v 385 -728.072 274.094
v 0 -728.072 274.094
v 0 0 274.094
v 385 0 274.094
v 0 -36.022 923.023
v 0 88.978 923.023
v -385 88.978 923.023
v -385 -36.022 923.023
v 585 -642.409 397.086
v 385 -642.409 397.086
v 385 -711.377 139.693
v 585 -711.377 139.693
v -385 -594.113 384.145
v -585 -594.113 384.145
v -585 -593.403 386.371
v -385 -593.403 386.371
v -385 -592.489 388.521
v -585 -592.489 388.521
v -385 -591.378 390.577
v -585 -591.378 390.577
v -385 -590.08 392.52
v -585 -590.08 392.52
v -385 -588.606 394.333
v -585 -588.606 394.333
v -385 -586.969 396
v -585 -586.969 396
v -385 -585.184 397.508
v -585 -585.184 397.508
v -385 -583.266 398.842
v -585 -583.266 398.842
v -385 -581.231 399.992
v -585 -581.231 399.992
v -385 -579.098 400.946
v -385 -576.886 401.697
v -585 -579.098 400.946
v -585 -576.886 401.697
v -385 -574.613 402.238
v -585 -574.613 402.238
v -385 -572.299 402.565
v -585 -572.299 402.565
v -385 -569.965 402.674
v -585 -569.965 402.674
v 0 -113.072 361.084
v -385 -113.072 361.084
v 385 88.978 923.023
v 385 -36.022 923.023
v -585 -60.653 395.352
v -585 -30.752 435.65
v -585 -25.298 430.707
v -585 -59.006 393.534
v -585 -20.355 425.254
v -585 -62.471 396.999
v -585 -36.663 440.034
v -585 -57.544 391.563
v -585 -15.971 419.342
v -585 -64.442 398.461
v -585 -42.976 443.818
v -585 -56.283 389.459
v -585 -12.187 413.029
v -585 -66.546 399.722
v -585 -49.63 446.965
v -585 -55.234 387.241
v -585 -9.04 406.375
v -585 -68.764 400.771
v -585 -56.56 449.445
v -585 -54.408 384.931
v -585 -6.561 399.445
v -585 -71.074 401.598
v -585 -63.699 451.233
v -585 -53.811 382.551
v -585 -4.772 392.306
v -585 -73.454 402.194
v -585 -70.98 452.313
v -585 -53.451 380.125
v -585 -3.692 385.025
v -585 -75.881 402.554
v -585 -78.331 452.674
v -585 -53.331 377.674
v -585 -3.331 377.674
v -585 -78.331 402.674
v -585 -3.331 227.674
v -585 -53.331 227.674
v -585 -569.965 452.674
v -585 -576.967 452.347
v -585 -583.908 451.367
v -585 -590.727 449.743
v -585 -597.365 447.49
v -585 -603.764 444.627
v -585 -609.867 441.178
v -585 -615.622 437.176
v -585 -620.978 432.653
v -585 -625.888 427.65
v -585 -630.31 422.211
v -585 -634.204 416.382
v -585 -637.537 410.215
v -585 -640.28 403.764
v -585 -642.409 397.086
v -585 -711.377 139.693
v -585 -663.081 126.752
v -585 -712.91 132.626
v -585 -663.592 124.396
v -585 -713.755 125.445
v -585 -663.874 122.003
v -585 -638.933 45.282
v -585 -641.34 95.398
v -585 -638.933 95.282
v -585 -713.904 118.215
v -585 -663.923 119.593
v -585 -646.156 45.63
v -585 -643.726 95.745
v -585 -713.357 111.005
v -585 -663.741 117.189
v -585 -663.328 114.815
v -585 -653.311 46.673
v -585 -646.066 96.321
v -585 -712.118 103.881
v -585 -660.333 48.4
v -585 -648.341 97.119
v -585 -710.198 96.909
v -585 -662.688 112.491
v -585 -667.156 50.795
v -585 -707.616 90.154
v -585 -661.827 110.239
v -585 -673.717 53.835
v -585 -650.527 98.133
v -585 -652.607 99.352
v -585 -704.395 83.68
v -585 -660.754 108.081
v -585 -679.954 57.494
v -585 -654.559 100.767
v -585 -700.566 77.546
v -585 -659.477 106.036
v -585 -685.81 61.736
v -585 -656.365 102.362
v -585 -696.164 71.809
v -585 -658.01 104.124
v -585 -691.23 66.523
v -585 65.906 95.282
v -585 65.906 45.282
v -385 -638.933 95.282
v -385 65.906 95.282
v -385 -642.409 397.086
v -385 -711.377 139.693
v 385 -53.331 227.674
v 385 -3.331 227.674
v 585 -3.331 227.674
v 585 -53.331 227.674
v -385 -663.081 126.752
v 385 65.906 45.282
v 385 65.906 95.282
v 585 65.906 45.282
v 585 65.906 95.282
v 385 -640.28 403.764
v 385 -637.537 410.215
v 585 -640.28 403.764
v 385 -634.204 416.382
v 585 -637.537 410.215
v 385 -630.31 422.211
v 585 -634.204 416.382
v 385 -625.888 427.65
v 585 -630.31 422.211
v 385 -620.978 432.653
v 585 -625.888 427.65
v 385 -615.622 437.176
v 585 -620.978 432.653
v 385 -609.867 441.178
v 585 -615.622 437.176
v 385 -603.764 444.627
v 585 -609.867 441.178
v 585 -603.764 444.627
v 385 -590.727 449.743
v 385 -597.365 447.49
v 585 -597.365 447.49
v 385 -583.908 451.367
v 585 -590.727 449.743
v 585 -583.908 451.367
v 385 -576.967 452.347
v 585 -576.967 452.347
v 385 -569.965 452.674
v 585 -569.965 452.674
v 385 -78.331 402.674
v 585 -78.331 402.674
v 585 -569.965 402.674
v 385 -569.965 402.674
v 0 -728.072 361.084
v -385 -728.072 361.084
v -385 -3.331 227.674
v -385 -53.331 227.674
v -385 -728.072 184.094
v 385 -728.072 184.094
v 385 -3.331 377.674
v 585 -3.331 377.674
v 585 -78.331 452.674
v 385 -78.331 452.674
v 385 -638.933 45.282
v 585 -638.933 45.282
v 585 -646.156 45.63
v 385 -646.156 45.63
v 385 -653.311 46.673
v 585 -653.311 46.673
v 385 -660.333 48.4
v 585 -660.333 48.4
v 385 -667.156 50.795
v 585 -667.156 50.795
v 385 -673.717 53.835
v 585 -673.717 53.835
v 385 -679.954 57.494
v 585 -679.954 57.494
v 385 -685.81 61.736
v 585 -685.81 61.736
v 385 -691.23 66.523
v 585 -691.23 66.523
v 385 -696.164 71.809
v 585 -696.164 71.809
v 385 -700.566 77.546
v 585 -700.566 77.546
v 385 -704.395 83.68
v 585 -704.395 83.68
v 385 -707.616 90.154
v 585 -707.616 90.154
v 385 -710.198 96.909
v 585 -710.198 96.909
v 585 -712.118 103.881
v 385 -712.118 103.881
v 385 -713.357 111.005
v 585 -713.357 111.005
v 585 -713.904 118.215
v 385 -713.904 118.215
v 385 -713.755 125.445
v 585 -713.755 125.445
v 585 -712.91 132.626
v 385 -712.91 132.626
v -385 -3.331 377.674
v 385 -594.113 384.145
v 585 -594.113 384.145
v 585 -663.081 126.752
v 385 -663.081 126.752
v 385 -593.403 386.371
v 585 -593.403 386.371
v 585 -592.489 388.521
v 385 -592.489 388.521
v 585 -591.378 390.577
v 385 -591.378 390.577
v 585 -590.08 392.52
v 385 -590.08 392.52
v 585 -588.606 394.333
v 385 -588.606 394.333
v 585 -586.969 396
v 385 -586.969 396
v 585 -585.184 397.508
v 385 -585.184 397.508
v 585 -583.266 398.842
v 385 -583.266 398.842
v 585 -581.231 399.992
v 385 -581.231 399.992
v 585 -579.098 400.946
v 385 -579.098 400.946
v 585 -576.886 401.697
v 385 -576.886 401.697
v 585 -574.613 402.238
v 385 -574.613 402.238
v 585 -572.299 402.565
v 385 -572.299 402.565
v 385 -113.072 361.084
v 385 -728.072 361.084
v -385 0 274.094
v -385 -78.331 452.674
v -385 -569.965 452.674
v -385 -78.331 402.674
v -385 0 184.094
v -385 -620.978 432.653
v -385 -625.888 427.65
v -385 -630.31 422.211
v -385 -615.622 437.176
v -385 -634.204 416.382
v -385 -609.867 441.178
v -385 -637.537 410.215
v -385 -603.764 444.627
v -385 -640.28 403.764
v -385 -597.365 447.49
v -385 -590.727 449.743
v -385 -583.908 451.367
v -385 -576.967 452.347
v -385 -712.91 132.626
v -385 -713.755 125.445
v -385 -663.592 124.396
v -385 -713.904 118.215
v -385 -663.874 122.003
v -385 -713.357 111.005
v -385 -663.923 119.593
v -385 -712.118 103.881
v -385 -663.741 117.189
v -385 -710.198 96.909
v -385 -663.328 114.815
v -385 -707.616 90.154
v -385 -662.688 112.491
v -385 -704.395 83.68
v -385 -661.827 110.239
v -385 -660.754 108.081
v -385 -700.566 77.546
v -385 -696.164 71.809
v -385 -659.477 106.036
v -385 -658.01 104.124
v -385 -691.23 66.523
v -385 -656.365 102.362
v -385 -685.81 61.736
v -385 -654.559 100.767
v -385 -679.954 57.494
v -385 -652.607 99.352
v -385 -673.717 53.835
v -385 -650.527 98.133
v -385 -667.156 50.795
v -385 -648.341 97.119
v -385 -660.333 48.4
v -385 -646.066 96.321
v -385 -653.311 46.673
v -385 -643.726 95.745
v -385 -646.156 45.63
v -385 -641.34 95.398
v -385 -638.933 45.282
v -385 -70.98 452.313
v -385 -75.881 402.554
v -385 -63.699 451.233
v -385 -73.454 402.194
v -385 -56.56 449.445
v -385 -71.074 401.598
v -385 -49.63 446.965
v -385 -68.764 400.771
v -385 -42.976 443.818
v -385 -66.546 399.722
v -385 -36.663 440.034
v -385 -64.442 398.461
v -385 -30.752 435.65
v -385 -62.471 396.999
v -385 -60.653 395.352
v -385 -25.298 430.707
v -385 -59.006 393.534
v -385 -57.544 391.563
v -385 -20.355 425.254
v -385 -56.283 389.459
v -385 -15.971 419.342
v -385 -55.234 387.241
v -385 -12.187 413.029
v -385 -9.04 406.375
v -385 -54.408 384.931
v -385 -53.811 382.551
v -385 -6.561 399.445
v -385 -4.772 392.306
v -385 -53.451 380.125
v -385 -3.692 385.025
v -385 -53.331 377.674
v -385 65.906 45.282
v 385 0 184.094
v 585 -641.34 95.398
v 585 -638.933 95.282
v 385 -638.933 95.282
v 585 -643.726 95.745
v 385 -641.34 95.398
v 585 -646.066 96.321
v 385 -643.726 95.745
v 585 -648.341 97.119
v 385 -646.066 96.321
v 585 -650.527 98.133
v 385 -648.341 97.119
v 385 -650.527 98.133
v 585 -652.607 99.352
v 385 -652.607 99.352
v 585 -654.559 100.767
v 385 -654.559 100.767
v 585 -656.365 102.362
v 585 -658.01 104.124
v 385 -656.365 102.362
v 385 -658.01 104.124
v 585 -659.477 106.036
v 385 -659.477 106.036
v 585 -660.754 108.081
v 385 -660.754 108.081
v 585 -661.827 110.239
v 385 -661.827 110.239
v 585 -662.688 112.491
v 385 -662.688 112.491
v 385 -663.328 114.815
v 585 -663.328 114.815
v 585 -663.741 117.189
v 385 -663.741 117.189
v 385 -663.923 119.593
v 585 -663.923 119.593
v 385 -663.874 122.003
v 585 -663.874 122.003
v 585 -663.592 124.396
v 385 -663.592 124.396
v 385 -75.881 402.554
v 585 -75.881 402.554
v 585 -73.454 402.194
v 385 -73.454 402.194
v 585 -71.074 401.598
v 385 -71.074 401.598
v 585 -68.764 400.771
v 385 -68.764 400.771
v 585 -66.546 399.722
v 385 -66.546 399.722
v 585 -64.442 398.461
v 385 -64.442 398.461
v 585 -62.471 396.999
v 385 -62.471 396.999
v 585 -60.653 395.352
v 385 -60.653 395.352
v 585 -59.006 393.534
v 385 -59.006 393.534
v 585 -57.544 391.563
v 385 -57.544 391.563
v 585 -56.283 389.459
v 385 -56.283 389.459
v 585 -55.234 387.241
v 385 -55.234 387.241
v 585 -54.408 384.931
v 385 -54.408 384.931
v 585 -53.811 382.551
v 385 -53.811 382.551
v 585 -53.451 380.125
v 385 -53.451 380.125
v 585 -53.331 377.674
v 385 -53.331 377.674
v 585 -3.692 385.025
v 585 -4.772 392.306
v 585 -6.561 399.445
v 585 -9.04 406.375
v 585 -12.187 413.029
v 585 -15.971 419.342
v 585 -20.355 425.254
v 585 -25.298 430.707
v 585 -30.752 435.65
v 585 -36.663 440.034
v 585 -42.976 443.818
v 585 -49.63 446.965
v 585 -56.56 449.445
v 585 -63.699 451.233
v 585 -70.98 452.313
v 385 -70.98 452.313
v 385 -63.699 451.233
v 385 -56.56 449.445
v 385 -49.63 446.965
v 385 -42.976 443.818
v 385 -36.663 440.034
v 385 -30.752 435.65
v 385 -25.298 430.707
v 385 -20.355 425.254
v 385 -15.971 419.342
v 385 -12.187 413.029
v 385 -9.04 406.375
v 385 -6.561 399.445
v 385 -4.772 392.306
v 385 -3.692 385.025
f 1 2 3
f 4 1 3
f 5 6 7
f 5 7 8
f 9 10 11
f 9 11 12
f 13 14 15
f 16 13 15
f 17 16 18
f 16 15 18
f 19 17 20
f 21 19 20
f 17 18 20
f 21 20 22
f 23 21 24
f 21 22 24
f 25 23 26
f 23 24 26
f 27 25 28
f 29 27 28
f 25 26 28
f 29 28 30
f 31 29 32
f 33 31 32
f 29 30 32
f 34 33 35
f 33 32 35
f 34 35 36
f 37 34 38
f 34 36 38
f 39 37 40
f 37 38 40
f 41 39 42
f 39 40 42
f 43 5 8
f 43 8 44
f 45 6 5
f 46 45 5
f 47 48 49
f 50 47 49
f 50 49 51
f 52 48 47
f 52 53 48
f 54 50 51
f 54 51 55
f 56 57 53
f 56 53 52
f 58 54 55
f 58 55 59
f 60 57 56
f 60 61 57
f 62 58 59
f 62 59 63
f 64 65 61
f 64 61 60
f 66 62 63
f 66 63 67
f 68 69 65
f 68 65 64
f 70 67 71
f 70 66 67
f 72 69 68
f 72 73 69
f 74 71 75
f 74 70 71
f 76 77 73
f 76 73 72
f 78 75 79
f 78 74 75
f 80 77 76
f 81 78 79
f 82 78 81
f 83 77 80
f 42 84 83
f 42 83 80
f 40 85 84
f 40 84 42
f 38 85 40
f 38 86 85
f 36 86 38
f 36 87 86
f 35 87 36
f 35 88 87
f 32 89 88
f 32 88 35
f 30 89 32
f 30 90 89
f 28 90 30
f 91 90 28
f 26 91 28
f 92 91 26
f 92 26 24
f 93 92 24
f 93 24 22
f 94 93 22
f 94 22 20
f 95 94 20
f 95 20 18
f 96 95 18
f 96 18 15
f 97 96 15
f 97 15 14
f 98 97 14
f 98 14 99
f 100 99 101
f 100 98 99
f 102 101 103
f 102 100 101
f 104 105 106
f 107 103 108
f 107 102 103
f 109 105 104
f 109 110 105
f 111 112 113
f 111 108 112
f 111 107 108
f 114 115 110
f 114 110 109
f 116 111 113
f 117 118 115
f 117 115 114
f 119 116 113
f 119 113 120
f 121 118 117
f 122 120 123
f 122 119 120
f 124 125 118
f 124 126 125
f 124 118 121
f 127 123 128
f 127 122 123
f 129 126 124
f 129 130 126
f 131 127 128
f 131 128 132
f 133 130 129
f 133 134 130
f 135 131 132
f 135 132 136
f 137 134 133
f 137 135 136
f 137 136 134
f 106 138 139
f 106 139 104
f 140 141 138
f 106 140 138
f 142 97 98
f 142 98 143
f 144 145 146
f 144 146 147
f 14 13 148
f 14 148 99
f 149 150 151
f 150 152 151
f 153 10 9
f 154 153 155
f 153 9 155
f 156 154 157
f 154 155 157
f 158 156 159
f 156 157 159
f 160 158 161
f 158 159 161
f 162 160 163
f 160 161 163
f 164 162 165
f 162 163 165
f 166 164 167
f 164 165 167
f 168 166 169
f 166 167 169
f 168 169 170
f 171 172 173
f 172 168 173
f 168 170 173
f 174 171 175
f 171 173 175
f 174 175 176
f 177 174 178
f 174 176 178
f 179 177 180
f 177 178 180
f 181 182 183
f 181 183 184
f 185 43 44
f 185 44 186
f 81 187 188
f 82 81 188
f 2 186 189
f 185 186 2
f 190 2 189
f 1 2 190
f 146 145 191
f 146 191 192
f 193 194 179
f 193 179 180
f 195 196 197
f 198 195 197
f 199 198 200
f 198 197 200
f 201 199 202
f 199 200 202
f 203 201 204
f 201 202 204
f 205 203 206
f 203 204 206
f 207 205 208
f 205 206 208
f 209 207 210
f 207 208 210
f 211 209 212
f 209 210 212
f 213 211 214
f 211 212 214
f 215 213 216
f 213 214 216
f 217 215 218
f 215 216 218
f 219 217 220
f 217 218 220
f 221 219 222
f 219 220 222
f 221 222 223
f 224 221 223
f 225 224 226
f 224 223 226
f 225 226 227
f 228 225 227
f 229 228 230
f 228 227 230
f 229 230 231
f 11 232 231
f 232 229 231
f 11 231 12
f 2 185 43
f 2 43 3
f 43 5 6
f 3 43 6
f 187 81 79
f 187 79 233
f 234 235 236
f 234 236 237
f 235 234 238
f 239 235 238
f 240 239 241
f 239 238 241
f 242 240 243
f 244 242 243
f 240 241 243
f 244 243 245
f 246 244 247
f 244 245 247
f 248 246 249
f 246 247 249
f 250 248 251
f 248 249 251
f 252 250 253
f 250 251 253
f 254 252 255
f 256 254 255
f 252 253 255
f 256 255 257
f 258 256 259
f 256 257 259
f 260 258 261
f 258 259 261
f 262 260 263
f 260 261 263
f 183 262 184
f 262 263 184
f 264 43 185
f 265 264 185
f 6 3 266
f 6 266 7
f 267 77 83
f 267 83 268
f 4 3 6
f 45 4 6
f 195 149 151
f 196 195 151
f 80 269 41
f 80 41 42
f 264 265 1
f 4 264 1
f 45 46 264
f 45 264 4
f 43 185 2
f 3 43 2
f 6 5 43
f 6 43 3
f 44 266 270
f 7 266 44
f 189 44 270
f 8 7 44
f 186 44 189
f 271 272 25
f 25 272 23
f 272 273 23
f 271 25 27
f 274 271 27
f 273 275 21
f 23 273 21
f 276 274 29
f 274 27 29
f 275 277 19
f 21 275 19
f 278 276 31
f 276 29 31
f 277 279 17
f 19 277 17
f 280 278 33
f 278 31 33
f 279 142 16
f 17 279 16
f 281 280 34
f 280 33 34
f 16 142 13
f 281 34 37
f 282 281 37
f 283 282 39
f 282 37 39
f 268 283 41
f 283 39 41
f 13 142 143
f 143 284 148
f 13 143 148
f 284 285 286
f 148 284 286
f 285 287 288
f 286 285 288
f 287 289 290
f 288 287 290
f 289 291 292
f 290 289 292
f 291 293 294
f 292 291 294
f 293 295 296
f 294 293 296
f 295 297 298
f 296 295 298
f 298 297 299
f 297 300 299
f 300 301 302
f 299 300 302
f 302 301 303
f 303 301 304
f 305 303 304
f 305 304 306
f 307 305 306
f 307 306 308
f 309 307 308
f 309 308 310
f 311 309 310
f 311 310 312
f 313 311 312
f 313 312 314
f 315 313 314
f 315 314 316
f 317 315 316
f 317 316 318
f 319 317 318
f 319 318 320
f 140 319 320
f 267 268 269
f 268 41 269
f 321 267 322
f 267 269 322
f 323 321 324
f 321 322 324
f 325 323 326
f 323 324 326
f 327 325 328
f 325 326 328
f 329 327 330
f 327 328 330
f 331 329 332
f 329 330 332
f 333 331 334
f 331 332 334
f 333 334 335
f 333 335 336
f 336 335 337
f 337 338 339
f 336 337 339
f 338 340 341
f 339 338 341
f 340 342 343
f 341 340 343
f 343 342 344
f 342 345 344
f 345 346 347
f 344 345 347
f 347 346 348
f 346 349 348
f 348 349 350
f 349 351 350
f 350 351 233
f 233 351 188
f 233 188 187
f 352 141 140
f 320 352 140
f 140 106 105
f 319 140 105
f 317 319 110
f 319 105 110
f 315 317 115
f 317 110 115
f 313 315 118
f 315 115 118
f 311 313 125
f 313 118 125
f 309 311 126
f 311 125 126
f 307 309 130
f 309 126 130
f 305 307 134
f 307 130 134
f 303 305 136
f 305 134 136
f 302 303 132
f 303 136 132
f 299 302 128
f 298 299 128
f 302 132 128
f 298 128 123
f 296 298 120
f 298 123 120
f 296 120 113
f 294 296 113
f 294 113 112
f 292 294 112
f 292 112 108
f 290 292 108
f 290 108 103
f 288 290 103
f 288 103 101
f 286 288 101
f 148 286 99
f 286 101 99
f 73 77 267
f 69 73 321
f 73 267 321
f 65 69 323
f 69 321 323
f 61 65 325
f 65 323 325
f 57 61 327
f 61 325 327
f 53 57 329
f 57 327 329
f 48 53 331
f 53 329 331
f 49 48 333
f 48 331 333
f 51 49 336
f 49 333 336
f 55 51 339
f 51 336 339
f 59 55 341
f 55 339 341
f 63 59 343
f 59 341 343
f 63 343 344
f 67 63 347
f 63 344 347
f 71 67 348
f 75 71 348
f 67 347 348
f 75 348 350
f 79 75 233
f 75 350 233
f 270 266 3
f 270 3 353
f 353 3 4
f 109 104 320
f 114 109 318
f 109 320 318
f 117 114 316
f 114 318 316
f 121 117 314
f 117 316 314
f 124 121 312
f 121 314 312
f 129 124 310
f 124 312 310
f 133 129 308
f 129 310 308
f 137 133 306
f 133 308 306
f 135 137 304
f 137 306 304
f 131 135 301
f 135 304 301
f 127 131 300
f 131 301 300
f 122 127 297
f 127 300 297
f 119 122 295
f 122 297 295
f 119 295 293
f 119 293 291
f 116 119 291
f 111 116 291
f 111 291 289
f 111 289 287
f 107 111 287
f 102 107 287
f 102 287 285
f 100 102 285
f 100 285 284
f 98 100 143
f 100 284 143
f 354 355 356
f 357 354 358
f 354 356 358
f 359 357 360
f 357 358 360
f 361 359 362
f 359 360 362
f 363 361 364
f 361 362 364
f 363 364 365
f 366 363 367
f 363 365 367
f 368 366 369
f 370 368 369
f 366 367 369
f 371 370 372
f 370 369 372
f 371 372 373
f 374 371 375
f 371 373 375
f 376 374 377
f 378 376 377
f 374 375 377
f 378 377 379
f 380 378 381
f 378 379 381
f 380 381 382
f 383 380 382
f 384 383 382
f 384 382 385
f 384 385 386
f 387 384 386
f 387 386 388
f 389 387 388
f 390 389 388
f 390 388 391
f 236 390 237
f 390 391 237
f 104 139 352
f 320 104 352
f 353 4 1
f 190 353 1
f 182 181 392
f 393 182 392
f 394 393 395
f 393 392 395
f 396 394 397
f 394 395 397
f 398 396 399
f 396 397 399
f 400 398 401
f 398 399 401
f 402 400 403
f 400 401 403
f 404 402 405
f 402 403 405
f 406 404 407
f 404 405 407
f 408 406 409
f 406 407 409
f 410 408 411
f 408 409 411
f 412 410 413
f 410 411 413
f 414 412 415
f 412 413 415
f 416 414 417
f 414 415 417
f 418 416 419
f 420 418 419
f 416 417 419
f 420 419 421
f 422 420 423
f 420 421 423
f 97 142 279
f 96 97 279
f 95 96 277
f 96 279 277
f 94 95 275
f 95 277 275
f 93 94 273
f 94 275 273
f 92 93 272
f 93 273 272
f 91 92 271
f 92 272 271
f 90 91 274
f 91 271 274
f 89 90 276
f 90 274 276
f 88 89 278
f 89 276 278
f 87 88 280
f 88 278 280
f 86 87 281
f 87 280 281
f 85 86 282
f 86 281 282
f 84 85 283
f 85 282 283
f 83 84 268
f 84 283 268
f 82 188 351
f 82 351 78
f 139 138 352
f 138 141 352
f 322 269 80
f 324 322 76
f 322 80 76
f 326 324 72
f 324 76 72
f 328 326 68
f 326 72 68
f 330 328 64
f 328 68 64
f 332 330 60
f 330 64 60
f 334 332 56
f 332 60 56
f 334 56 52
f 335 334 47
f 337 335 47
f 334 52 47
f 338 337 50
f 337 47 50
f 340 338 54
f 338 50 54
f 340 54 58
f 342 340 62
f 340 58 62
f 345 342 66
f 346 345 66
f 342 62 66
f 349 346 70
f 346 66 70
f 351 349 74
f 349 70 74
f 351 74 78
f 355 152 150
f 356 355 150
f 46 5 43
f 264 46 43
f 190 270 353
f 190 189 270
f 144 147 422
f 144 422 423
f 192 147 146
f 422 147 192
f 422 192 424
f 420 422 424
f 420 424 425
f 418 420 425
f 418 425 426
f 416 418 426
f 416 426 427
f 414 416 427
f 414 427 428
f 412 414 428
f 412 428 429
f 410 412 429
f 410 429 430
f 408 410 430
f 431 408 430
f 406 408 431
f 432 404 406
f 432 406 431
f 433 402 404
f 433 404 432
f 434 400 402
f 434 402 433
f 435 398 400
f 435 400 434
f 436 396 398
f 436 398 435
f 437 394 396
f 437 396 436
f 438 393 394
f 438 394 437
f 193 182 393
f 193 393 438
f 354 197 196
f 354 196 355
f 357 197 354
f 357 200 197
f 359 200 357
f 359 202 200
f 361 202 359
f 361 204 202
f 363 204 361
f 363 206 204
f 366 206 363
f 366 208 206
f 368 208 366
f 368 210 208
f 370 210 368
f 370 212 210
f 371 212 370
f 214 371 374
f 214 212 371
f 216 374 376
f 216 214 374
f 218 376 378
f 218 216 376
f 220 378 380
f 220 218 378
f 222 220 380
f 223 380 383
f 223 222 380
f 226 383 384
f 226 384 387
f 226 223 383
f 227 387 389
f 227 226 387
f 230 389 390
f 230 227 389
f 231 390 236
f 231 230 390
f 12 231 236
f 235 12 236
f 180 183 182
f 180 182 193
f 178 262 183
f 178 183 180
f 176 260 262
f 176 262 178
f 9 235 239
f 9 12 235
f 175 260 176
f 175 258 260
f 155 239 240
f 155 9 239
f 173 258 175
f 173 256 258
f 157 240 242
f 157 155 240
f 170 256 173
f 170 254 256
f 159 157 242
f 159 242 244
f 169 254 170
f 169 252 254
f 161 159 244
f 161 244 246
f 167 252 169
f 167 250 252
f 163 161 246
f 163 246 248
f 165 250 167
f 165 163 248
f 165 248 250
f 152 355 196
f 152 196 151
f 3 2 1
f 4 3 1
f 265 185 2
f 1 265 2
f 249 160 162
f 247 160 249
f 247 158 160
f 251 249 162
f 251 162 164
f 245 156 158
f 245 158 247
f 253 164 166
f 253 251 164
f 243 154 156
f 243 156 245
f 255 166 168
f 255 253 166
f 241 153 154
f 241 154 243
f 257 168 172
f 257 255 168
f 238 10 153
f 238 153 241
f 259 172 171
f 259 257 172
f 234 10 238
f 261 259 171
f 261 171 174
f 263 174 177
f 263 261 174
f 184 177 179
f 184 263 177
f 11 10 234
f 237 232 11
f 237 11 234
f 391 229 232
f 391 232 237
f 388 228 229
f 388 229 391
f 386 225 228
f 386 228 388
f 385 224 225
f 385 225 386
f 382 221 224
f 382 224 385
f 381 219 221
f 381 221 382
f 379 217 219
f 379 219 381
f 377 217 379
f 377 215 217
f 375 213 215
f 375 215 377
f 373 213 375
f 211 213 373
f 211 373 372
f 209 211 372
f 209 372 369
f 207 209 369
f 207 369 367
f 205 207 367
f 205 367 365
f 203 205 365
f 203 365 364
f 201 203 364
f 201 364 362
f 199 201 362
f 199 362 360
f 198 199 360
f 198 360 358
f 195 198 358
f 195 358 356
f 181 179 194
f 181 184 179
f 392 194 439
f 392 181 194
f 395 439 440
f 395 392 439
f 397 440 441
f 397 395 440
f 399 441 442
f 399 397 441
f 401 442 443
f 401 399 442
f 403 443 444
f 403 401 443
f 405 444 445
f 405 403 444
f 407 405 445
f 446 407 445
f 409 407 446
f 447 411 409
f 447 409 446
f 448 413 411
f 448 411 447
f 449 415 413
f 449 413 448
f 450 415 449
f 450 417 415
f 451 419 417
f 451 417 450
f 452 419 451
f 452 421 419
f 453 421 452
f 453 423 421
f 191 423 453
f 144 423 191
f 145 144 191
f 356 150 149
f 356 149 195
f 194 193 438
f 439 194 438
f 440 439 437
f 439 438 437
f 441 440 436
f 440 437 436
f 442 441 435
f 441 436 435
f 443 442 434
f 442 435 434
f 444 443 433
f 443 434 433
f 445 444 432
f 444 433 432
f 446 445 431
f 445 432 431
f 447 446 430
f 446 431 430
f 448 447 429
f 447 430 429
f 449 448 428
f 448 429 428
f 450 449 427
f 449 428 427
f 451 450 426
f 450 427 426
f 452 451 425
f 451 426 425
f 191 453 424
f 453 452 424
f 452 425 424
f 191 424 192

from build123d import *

# Parameters (mm, degrees)
F1_W       = 1170
F1_H       = 50
F3_W       = 770
F3_H       = 900
F4_DEPTH   = 600
F6_DEPTH   = 385
F7_DEPTH   = 385
F7_FACE_W  = 385
F7_FACE_H  = 728.0723833729
F7_FACE1_W = 385
F7_FACE1_H = 728.0723833729
F8_DEPTH   = 90


# Not quite as in the source:
# - an extrude ends at something that could not be found from the text; its depth is read off the source's solid


with BuildPart() as f2:
    # F2: sweep along a path in F0
    with BuildLine(Plane.YZ) as f2_path:
        Line((65.9058558057, 70.2815868228), (-638.9328755523, 70.2815868228))
        ThreePointArc((-638.9328755523, 70.2815868228), (-678.6005425668, 89.8435153723), (-687.2291668667, 133.2225390779))
        Line((-687.2291668667, 133.2225390779), (-618.2610394219, 390.6150948048))
        ThreePointArc((-618.2610394219, 390.6150948048), (-600.4028195579, 417.3418095643), (-569.9647481074, 427.6741425497))
        Line((-569.9647481074, 427.6741425497), (-78.3310975064, 427.6741425497))
        ThreePointArc((-78.3310975064, 427.6741425497), (-42.9757584471, 413.029481609), (-28.3310975064, 377.6741425497))
        Line((-28.3310975064, 377.6741425497), (-28.3310975064, 227.6741425497))
    # F1 (on Front) → F2 (sweep)
    with BuildSketch(Plane.XZ):
        with Locations((0, 70.2815868228)):
            Rectangle(F1_W, F1_H)
    sweep(path=f2_path.line)

    # F3 (on Top) → F4 (cut)
    with BuildSketch(Plane.XY):
        with Locations((0, -311.2359523773)):
            Rectangle(F3_W, F3_H)
    extrude(amount=F4_DEPTH, mode=Mode.SUBTRACT)


with BuildPart() as f6:
    # F5 (on Right) → F6 (new body, through all)
    with BuildSketch(Plane.YZ):
        Polygon((-728.0723833729, 361.0842398319), (-728.0723833729, 274.0944385529), (0, 274.0944385529), (88.9778784892, 923.0227374731), (-36.0221215108, 923.0227374731), (-113.0723833729, 361.0842398319), align=None)
    extrude(amount=F6_DEPTH)


with BuildPart() as f7:
    # F7 (new, through all): a face of the model
    f7_faces = [f6.part.faces().sort_by_distance(p)[0] for p in [
        (0, -420.5723833729, 350.6502613598),
    ]]
    extrude(f7_faces, amount=F7_DEPTH)

    # F7_face (on face) + F7_face1 (on face) → F8 (join)
    with BuildSketch(Plane(origin=(192.5, -364.0361916864, 274.0944385529), x_dir=(1, 0, 0), z_dir=(0, 0, -1))):
        Rectangle(F7_FACE_W, F7_FACE_H)
    with BuildSketch(Plane(origin=(-192.5, -364.0361916864, 274.0944385529), x_dir=(1, 0, 0), z_dir=(0, 0, -1))):
        Rectangle(F7_FACE1_W, F7_FACE1_H)
    extrude(amount=F8_DEPTH)


solid = Compound([f2.part, f6.part, f7.part])
